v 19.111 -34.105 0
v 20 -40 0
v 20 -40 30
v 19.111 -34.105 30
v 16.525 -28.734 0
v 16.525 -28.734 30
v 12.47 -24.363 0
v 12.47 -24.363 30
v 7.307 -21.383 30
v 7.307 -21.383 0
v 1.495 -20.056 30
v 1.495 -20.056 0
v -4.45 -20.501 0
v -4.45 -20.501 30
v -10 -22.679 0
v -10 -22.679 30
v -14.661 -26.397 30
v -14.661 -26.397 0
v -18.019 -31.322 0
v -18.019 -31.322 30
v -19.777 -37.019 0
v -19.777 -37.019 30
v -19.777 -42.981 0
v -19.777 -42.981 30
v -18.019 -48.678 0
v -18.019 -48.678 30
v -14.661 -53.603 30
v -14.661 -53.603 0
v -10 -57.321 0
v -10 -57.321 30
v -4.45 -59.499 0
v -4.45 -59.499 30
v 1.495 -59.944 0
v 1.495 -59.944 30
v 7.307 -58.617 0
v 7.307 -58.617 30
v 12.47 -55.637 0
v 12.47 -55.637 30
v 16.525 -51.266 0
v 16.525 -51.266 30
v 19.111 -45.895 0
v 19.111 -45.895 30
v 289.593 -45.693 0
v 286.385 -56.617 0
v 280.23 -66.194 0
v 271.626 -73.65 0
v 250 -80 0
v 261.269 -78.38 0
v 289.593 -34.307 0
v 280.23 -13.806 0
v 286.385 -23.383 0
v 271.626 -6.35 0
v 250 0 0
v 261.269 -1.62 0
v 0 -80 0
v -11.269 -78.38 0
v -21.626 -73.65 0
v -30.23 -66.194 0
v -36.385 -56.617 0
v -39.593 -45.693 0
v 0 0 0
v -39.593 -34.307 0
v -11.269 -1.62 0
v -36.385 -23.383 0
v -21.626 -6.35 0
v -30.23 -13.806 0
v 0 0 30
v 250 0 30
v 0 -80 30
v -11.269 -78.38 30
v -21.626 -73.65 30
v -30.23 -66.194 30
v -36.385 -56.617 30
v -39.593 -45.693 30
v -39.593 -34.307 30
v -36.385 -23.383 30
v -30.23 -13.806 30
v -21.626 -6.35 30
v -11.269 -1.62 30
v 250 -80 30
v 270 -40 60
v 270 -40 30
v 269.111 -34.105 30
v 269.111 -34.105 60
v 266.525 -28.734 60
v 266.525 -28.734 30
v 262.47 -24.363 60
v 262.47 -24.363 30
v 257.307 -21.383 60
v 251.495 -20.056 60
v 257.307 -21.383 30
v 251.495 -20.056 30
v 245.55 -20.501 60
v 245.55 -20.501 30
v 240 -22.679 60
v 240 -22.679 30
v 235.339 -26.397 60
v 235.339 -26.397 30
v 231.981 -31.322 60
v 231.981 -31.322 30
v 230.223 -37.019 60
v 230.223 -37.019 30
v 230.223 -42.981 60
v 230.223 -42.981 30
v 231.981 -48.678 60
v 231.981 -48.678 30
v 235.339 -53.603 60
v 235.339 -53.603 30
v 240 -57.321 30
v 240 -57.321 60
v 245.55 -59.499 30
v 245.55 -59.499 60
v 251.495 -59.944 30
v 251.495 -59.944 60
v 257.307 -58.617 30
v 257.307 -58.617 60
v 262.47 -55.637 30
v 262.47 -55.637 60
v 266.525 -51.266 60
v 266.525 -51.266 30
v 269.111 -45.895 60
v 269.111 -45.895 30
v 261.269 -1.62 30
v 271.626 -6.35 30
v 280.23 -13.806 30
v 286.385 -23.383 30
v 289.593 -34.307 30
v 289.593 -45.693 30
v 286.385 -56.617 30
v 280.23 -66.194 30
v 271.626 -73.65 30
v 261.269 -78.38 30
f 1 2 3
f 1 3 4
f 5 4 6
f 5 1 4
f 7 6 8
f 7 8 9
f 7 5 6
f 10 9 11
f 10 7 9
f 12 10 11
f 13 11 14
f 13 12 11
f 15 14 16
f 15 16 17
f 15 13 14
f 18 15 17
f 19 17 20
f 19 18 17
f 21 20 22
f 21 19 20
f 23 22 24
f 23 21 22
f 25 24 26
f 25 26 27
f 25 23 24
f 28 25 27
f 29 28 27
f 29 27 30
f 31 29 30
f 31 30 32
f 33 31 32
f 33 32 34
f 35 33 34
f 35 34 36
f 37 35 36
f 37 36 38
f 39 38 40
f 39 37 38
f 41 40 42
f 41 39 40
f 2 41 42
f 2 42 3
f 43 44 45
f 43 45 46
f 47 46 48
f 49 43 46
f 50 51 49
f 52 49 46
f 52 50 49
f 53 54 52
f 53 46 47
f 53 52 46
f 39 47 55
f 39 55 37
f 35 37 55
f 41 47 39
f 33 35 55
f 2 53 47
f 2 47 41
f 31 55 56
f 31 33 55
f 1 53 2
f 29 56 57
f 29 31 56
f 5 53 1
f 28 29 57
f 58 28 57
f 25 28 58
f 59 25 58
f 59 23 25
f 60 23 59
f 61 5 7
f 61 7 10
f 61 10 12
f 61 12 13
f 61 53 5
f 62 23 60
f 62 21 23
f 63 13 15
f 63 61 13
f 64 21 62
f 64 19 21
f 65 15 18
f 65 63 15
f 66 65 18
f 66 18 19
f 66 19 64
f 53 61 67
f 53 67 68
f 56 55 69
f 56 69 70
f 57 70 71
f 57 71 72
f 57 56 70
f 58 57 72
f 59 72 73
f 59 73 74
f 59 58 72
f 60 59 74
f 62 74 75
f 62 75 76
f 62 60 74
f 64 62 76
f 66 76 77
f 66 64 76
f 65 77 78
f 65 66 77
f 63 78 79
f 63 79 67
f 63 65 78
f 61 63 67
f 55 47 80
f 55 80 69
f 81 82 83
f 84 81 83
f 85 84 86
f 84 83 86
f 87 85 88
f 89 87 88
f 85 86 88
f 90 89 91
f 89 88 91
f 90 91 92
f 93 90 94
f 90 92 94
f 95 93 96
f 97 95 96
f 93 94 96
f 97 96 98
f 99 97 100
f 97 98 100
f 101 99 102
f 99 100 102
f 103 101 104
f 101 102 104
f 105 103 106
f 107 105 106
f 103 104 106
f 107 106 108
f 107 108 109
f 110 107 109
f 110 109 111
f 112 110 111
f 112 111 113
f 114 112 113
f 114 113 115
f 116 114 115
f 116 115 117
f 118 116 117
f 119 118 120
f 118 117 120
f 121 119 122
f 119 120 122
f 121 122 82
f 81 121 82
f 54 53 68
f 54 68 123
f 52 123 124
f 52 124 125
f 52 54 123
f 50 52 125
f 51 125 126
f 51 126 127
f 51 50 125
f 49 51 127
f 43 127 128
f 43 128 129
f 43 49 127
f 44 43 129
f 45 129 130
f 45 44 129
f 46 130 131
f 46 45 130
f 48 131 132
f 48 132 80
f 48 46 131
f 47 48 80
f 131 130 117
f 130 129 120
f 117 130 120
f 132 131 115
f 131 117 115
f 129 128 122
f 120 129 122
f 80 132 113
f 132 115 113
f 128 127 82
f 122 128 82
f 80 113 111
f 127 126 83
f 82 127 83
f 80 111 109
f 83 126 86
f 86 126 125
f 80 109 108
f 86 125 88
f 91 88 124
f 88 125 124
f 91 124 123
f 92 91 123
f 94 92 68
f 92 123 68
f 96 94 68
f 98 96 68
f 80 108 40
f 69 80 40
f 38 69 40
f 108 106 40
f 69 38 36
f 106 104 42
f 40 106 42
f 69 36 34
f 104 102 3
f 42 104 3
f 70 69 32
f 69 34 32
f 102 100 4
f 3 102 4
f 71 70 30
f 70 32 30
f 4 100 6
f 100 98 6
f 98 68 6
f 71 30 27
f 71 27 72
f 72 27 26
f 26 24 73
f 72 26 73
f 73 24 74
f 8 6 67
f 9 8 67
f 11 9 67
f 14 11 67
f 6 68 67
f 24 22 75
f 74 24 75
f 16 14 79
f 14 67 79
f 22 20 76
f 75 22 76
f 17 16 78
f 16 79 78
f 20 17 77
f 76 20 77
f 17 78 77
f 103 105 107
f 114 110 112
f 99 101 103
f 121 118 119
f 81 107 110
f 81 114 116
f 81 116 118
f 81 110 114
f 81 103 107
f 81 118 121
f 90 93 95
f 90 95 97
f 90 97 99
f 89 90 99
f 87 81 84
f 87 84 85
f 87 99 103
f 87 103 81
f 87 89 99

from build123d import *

# Parameters (mm, degrees)
SKETCH2_R           = 20
BOSS_EXTRUDE1_DEPTH = 30
SKETCH7_R           = 20
BOSS_EXTRUDE2_DEPTH = 30


with BuildPart() as part:
    # Sketch2 → Boss-Extrude1 (new body)
    with BuildSketch(Plane.XY):
        with BuildLine():
            Line((0, 0), (250, 0))
            ThreePointArc((250, 0), (290, -40), (250, -80))
            Line((250, -80), (0, -80))
            ThreePointArc((0, -80), (-40, -40), (0, 0))
        make_face()
        with Locations((0, -40)):
            Circle(SKETCH2_R, mode=Mode.SUBTRACT)
    extrude(amount=BOSS_EXTRUDE1_DEPTH)

    # Sketch7 → Boss-Extrude2 (add)
    with BuildSketch(Plane.XY.offset(30)):
        with Locations((250, -40)):
            Circle(SKETCH7_R)
    extrude(amount=BOSS_EXTRUDE2_DEPTH)


solid = part.part
